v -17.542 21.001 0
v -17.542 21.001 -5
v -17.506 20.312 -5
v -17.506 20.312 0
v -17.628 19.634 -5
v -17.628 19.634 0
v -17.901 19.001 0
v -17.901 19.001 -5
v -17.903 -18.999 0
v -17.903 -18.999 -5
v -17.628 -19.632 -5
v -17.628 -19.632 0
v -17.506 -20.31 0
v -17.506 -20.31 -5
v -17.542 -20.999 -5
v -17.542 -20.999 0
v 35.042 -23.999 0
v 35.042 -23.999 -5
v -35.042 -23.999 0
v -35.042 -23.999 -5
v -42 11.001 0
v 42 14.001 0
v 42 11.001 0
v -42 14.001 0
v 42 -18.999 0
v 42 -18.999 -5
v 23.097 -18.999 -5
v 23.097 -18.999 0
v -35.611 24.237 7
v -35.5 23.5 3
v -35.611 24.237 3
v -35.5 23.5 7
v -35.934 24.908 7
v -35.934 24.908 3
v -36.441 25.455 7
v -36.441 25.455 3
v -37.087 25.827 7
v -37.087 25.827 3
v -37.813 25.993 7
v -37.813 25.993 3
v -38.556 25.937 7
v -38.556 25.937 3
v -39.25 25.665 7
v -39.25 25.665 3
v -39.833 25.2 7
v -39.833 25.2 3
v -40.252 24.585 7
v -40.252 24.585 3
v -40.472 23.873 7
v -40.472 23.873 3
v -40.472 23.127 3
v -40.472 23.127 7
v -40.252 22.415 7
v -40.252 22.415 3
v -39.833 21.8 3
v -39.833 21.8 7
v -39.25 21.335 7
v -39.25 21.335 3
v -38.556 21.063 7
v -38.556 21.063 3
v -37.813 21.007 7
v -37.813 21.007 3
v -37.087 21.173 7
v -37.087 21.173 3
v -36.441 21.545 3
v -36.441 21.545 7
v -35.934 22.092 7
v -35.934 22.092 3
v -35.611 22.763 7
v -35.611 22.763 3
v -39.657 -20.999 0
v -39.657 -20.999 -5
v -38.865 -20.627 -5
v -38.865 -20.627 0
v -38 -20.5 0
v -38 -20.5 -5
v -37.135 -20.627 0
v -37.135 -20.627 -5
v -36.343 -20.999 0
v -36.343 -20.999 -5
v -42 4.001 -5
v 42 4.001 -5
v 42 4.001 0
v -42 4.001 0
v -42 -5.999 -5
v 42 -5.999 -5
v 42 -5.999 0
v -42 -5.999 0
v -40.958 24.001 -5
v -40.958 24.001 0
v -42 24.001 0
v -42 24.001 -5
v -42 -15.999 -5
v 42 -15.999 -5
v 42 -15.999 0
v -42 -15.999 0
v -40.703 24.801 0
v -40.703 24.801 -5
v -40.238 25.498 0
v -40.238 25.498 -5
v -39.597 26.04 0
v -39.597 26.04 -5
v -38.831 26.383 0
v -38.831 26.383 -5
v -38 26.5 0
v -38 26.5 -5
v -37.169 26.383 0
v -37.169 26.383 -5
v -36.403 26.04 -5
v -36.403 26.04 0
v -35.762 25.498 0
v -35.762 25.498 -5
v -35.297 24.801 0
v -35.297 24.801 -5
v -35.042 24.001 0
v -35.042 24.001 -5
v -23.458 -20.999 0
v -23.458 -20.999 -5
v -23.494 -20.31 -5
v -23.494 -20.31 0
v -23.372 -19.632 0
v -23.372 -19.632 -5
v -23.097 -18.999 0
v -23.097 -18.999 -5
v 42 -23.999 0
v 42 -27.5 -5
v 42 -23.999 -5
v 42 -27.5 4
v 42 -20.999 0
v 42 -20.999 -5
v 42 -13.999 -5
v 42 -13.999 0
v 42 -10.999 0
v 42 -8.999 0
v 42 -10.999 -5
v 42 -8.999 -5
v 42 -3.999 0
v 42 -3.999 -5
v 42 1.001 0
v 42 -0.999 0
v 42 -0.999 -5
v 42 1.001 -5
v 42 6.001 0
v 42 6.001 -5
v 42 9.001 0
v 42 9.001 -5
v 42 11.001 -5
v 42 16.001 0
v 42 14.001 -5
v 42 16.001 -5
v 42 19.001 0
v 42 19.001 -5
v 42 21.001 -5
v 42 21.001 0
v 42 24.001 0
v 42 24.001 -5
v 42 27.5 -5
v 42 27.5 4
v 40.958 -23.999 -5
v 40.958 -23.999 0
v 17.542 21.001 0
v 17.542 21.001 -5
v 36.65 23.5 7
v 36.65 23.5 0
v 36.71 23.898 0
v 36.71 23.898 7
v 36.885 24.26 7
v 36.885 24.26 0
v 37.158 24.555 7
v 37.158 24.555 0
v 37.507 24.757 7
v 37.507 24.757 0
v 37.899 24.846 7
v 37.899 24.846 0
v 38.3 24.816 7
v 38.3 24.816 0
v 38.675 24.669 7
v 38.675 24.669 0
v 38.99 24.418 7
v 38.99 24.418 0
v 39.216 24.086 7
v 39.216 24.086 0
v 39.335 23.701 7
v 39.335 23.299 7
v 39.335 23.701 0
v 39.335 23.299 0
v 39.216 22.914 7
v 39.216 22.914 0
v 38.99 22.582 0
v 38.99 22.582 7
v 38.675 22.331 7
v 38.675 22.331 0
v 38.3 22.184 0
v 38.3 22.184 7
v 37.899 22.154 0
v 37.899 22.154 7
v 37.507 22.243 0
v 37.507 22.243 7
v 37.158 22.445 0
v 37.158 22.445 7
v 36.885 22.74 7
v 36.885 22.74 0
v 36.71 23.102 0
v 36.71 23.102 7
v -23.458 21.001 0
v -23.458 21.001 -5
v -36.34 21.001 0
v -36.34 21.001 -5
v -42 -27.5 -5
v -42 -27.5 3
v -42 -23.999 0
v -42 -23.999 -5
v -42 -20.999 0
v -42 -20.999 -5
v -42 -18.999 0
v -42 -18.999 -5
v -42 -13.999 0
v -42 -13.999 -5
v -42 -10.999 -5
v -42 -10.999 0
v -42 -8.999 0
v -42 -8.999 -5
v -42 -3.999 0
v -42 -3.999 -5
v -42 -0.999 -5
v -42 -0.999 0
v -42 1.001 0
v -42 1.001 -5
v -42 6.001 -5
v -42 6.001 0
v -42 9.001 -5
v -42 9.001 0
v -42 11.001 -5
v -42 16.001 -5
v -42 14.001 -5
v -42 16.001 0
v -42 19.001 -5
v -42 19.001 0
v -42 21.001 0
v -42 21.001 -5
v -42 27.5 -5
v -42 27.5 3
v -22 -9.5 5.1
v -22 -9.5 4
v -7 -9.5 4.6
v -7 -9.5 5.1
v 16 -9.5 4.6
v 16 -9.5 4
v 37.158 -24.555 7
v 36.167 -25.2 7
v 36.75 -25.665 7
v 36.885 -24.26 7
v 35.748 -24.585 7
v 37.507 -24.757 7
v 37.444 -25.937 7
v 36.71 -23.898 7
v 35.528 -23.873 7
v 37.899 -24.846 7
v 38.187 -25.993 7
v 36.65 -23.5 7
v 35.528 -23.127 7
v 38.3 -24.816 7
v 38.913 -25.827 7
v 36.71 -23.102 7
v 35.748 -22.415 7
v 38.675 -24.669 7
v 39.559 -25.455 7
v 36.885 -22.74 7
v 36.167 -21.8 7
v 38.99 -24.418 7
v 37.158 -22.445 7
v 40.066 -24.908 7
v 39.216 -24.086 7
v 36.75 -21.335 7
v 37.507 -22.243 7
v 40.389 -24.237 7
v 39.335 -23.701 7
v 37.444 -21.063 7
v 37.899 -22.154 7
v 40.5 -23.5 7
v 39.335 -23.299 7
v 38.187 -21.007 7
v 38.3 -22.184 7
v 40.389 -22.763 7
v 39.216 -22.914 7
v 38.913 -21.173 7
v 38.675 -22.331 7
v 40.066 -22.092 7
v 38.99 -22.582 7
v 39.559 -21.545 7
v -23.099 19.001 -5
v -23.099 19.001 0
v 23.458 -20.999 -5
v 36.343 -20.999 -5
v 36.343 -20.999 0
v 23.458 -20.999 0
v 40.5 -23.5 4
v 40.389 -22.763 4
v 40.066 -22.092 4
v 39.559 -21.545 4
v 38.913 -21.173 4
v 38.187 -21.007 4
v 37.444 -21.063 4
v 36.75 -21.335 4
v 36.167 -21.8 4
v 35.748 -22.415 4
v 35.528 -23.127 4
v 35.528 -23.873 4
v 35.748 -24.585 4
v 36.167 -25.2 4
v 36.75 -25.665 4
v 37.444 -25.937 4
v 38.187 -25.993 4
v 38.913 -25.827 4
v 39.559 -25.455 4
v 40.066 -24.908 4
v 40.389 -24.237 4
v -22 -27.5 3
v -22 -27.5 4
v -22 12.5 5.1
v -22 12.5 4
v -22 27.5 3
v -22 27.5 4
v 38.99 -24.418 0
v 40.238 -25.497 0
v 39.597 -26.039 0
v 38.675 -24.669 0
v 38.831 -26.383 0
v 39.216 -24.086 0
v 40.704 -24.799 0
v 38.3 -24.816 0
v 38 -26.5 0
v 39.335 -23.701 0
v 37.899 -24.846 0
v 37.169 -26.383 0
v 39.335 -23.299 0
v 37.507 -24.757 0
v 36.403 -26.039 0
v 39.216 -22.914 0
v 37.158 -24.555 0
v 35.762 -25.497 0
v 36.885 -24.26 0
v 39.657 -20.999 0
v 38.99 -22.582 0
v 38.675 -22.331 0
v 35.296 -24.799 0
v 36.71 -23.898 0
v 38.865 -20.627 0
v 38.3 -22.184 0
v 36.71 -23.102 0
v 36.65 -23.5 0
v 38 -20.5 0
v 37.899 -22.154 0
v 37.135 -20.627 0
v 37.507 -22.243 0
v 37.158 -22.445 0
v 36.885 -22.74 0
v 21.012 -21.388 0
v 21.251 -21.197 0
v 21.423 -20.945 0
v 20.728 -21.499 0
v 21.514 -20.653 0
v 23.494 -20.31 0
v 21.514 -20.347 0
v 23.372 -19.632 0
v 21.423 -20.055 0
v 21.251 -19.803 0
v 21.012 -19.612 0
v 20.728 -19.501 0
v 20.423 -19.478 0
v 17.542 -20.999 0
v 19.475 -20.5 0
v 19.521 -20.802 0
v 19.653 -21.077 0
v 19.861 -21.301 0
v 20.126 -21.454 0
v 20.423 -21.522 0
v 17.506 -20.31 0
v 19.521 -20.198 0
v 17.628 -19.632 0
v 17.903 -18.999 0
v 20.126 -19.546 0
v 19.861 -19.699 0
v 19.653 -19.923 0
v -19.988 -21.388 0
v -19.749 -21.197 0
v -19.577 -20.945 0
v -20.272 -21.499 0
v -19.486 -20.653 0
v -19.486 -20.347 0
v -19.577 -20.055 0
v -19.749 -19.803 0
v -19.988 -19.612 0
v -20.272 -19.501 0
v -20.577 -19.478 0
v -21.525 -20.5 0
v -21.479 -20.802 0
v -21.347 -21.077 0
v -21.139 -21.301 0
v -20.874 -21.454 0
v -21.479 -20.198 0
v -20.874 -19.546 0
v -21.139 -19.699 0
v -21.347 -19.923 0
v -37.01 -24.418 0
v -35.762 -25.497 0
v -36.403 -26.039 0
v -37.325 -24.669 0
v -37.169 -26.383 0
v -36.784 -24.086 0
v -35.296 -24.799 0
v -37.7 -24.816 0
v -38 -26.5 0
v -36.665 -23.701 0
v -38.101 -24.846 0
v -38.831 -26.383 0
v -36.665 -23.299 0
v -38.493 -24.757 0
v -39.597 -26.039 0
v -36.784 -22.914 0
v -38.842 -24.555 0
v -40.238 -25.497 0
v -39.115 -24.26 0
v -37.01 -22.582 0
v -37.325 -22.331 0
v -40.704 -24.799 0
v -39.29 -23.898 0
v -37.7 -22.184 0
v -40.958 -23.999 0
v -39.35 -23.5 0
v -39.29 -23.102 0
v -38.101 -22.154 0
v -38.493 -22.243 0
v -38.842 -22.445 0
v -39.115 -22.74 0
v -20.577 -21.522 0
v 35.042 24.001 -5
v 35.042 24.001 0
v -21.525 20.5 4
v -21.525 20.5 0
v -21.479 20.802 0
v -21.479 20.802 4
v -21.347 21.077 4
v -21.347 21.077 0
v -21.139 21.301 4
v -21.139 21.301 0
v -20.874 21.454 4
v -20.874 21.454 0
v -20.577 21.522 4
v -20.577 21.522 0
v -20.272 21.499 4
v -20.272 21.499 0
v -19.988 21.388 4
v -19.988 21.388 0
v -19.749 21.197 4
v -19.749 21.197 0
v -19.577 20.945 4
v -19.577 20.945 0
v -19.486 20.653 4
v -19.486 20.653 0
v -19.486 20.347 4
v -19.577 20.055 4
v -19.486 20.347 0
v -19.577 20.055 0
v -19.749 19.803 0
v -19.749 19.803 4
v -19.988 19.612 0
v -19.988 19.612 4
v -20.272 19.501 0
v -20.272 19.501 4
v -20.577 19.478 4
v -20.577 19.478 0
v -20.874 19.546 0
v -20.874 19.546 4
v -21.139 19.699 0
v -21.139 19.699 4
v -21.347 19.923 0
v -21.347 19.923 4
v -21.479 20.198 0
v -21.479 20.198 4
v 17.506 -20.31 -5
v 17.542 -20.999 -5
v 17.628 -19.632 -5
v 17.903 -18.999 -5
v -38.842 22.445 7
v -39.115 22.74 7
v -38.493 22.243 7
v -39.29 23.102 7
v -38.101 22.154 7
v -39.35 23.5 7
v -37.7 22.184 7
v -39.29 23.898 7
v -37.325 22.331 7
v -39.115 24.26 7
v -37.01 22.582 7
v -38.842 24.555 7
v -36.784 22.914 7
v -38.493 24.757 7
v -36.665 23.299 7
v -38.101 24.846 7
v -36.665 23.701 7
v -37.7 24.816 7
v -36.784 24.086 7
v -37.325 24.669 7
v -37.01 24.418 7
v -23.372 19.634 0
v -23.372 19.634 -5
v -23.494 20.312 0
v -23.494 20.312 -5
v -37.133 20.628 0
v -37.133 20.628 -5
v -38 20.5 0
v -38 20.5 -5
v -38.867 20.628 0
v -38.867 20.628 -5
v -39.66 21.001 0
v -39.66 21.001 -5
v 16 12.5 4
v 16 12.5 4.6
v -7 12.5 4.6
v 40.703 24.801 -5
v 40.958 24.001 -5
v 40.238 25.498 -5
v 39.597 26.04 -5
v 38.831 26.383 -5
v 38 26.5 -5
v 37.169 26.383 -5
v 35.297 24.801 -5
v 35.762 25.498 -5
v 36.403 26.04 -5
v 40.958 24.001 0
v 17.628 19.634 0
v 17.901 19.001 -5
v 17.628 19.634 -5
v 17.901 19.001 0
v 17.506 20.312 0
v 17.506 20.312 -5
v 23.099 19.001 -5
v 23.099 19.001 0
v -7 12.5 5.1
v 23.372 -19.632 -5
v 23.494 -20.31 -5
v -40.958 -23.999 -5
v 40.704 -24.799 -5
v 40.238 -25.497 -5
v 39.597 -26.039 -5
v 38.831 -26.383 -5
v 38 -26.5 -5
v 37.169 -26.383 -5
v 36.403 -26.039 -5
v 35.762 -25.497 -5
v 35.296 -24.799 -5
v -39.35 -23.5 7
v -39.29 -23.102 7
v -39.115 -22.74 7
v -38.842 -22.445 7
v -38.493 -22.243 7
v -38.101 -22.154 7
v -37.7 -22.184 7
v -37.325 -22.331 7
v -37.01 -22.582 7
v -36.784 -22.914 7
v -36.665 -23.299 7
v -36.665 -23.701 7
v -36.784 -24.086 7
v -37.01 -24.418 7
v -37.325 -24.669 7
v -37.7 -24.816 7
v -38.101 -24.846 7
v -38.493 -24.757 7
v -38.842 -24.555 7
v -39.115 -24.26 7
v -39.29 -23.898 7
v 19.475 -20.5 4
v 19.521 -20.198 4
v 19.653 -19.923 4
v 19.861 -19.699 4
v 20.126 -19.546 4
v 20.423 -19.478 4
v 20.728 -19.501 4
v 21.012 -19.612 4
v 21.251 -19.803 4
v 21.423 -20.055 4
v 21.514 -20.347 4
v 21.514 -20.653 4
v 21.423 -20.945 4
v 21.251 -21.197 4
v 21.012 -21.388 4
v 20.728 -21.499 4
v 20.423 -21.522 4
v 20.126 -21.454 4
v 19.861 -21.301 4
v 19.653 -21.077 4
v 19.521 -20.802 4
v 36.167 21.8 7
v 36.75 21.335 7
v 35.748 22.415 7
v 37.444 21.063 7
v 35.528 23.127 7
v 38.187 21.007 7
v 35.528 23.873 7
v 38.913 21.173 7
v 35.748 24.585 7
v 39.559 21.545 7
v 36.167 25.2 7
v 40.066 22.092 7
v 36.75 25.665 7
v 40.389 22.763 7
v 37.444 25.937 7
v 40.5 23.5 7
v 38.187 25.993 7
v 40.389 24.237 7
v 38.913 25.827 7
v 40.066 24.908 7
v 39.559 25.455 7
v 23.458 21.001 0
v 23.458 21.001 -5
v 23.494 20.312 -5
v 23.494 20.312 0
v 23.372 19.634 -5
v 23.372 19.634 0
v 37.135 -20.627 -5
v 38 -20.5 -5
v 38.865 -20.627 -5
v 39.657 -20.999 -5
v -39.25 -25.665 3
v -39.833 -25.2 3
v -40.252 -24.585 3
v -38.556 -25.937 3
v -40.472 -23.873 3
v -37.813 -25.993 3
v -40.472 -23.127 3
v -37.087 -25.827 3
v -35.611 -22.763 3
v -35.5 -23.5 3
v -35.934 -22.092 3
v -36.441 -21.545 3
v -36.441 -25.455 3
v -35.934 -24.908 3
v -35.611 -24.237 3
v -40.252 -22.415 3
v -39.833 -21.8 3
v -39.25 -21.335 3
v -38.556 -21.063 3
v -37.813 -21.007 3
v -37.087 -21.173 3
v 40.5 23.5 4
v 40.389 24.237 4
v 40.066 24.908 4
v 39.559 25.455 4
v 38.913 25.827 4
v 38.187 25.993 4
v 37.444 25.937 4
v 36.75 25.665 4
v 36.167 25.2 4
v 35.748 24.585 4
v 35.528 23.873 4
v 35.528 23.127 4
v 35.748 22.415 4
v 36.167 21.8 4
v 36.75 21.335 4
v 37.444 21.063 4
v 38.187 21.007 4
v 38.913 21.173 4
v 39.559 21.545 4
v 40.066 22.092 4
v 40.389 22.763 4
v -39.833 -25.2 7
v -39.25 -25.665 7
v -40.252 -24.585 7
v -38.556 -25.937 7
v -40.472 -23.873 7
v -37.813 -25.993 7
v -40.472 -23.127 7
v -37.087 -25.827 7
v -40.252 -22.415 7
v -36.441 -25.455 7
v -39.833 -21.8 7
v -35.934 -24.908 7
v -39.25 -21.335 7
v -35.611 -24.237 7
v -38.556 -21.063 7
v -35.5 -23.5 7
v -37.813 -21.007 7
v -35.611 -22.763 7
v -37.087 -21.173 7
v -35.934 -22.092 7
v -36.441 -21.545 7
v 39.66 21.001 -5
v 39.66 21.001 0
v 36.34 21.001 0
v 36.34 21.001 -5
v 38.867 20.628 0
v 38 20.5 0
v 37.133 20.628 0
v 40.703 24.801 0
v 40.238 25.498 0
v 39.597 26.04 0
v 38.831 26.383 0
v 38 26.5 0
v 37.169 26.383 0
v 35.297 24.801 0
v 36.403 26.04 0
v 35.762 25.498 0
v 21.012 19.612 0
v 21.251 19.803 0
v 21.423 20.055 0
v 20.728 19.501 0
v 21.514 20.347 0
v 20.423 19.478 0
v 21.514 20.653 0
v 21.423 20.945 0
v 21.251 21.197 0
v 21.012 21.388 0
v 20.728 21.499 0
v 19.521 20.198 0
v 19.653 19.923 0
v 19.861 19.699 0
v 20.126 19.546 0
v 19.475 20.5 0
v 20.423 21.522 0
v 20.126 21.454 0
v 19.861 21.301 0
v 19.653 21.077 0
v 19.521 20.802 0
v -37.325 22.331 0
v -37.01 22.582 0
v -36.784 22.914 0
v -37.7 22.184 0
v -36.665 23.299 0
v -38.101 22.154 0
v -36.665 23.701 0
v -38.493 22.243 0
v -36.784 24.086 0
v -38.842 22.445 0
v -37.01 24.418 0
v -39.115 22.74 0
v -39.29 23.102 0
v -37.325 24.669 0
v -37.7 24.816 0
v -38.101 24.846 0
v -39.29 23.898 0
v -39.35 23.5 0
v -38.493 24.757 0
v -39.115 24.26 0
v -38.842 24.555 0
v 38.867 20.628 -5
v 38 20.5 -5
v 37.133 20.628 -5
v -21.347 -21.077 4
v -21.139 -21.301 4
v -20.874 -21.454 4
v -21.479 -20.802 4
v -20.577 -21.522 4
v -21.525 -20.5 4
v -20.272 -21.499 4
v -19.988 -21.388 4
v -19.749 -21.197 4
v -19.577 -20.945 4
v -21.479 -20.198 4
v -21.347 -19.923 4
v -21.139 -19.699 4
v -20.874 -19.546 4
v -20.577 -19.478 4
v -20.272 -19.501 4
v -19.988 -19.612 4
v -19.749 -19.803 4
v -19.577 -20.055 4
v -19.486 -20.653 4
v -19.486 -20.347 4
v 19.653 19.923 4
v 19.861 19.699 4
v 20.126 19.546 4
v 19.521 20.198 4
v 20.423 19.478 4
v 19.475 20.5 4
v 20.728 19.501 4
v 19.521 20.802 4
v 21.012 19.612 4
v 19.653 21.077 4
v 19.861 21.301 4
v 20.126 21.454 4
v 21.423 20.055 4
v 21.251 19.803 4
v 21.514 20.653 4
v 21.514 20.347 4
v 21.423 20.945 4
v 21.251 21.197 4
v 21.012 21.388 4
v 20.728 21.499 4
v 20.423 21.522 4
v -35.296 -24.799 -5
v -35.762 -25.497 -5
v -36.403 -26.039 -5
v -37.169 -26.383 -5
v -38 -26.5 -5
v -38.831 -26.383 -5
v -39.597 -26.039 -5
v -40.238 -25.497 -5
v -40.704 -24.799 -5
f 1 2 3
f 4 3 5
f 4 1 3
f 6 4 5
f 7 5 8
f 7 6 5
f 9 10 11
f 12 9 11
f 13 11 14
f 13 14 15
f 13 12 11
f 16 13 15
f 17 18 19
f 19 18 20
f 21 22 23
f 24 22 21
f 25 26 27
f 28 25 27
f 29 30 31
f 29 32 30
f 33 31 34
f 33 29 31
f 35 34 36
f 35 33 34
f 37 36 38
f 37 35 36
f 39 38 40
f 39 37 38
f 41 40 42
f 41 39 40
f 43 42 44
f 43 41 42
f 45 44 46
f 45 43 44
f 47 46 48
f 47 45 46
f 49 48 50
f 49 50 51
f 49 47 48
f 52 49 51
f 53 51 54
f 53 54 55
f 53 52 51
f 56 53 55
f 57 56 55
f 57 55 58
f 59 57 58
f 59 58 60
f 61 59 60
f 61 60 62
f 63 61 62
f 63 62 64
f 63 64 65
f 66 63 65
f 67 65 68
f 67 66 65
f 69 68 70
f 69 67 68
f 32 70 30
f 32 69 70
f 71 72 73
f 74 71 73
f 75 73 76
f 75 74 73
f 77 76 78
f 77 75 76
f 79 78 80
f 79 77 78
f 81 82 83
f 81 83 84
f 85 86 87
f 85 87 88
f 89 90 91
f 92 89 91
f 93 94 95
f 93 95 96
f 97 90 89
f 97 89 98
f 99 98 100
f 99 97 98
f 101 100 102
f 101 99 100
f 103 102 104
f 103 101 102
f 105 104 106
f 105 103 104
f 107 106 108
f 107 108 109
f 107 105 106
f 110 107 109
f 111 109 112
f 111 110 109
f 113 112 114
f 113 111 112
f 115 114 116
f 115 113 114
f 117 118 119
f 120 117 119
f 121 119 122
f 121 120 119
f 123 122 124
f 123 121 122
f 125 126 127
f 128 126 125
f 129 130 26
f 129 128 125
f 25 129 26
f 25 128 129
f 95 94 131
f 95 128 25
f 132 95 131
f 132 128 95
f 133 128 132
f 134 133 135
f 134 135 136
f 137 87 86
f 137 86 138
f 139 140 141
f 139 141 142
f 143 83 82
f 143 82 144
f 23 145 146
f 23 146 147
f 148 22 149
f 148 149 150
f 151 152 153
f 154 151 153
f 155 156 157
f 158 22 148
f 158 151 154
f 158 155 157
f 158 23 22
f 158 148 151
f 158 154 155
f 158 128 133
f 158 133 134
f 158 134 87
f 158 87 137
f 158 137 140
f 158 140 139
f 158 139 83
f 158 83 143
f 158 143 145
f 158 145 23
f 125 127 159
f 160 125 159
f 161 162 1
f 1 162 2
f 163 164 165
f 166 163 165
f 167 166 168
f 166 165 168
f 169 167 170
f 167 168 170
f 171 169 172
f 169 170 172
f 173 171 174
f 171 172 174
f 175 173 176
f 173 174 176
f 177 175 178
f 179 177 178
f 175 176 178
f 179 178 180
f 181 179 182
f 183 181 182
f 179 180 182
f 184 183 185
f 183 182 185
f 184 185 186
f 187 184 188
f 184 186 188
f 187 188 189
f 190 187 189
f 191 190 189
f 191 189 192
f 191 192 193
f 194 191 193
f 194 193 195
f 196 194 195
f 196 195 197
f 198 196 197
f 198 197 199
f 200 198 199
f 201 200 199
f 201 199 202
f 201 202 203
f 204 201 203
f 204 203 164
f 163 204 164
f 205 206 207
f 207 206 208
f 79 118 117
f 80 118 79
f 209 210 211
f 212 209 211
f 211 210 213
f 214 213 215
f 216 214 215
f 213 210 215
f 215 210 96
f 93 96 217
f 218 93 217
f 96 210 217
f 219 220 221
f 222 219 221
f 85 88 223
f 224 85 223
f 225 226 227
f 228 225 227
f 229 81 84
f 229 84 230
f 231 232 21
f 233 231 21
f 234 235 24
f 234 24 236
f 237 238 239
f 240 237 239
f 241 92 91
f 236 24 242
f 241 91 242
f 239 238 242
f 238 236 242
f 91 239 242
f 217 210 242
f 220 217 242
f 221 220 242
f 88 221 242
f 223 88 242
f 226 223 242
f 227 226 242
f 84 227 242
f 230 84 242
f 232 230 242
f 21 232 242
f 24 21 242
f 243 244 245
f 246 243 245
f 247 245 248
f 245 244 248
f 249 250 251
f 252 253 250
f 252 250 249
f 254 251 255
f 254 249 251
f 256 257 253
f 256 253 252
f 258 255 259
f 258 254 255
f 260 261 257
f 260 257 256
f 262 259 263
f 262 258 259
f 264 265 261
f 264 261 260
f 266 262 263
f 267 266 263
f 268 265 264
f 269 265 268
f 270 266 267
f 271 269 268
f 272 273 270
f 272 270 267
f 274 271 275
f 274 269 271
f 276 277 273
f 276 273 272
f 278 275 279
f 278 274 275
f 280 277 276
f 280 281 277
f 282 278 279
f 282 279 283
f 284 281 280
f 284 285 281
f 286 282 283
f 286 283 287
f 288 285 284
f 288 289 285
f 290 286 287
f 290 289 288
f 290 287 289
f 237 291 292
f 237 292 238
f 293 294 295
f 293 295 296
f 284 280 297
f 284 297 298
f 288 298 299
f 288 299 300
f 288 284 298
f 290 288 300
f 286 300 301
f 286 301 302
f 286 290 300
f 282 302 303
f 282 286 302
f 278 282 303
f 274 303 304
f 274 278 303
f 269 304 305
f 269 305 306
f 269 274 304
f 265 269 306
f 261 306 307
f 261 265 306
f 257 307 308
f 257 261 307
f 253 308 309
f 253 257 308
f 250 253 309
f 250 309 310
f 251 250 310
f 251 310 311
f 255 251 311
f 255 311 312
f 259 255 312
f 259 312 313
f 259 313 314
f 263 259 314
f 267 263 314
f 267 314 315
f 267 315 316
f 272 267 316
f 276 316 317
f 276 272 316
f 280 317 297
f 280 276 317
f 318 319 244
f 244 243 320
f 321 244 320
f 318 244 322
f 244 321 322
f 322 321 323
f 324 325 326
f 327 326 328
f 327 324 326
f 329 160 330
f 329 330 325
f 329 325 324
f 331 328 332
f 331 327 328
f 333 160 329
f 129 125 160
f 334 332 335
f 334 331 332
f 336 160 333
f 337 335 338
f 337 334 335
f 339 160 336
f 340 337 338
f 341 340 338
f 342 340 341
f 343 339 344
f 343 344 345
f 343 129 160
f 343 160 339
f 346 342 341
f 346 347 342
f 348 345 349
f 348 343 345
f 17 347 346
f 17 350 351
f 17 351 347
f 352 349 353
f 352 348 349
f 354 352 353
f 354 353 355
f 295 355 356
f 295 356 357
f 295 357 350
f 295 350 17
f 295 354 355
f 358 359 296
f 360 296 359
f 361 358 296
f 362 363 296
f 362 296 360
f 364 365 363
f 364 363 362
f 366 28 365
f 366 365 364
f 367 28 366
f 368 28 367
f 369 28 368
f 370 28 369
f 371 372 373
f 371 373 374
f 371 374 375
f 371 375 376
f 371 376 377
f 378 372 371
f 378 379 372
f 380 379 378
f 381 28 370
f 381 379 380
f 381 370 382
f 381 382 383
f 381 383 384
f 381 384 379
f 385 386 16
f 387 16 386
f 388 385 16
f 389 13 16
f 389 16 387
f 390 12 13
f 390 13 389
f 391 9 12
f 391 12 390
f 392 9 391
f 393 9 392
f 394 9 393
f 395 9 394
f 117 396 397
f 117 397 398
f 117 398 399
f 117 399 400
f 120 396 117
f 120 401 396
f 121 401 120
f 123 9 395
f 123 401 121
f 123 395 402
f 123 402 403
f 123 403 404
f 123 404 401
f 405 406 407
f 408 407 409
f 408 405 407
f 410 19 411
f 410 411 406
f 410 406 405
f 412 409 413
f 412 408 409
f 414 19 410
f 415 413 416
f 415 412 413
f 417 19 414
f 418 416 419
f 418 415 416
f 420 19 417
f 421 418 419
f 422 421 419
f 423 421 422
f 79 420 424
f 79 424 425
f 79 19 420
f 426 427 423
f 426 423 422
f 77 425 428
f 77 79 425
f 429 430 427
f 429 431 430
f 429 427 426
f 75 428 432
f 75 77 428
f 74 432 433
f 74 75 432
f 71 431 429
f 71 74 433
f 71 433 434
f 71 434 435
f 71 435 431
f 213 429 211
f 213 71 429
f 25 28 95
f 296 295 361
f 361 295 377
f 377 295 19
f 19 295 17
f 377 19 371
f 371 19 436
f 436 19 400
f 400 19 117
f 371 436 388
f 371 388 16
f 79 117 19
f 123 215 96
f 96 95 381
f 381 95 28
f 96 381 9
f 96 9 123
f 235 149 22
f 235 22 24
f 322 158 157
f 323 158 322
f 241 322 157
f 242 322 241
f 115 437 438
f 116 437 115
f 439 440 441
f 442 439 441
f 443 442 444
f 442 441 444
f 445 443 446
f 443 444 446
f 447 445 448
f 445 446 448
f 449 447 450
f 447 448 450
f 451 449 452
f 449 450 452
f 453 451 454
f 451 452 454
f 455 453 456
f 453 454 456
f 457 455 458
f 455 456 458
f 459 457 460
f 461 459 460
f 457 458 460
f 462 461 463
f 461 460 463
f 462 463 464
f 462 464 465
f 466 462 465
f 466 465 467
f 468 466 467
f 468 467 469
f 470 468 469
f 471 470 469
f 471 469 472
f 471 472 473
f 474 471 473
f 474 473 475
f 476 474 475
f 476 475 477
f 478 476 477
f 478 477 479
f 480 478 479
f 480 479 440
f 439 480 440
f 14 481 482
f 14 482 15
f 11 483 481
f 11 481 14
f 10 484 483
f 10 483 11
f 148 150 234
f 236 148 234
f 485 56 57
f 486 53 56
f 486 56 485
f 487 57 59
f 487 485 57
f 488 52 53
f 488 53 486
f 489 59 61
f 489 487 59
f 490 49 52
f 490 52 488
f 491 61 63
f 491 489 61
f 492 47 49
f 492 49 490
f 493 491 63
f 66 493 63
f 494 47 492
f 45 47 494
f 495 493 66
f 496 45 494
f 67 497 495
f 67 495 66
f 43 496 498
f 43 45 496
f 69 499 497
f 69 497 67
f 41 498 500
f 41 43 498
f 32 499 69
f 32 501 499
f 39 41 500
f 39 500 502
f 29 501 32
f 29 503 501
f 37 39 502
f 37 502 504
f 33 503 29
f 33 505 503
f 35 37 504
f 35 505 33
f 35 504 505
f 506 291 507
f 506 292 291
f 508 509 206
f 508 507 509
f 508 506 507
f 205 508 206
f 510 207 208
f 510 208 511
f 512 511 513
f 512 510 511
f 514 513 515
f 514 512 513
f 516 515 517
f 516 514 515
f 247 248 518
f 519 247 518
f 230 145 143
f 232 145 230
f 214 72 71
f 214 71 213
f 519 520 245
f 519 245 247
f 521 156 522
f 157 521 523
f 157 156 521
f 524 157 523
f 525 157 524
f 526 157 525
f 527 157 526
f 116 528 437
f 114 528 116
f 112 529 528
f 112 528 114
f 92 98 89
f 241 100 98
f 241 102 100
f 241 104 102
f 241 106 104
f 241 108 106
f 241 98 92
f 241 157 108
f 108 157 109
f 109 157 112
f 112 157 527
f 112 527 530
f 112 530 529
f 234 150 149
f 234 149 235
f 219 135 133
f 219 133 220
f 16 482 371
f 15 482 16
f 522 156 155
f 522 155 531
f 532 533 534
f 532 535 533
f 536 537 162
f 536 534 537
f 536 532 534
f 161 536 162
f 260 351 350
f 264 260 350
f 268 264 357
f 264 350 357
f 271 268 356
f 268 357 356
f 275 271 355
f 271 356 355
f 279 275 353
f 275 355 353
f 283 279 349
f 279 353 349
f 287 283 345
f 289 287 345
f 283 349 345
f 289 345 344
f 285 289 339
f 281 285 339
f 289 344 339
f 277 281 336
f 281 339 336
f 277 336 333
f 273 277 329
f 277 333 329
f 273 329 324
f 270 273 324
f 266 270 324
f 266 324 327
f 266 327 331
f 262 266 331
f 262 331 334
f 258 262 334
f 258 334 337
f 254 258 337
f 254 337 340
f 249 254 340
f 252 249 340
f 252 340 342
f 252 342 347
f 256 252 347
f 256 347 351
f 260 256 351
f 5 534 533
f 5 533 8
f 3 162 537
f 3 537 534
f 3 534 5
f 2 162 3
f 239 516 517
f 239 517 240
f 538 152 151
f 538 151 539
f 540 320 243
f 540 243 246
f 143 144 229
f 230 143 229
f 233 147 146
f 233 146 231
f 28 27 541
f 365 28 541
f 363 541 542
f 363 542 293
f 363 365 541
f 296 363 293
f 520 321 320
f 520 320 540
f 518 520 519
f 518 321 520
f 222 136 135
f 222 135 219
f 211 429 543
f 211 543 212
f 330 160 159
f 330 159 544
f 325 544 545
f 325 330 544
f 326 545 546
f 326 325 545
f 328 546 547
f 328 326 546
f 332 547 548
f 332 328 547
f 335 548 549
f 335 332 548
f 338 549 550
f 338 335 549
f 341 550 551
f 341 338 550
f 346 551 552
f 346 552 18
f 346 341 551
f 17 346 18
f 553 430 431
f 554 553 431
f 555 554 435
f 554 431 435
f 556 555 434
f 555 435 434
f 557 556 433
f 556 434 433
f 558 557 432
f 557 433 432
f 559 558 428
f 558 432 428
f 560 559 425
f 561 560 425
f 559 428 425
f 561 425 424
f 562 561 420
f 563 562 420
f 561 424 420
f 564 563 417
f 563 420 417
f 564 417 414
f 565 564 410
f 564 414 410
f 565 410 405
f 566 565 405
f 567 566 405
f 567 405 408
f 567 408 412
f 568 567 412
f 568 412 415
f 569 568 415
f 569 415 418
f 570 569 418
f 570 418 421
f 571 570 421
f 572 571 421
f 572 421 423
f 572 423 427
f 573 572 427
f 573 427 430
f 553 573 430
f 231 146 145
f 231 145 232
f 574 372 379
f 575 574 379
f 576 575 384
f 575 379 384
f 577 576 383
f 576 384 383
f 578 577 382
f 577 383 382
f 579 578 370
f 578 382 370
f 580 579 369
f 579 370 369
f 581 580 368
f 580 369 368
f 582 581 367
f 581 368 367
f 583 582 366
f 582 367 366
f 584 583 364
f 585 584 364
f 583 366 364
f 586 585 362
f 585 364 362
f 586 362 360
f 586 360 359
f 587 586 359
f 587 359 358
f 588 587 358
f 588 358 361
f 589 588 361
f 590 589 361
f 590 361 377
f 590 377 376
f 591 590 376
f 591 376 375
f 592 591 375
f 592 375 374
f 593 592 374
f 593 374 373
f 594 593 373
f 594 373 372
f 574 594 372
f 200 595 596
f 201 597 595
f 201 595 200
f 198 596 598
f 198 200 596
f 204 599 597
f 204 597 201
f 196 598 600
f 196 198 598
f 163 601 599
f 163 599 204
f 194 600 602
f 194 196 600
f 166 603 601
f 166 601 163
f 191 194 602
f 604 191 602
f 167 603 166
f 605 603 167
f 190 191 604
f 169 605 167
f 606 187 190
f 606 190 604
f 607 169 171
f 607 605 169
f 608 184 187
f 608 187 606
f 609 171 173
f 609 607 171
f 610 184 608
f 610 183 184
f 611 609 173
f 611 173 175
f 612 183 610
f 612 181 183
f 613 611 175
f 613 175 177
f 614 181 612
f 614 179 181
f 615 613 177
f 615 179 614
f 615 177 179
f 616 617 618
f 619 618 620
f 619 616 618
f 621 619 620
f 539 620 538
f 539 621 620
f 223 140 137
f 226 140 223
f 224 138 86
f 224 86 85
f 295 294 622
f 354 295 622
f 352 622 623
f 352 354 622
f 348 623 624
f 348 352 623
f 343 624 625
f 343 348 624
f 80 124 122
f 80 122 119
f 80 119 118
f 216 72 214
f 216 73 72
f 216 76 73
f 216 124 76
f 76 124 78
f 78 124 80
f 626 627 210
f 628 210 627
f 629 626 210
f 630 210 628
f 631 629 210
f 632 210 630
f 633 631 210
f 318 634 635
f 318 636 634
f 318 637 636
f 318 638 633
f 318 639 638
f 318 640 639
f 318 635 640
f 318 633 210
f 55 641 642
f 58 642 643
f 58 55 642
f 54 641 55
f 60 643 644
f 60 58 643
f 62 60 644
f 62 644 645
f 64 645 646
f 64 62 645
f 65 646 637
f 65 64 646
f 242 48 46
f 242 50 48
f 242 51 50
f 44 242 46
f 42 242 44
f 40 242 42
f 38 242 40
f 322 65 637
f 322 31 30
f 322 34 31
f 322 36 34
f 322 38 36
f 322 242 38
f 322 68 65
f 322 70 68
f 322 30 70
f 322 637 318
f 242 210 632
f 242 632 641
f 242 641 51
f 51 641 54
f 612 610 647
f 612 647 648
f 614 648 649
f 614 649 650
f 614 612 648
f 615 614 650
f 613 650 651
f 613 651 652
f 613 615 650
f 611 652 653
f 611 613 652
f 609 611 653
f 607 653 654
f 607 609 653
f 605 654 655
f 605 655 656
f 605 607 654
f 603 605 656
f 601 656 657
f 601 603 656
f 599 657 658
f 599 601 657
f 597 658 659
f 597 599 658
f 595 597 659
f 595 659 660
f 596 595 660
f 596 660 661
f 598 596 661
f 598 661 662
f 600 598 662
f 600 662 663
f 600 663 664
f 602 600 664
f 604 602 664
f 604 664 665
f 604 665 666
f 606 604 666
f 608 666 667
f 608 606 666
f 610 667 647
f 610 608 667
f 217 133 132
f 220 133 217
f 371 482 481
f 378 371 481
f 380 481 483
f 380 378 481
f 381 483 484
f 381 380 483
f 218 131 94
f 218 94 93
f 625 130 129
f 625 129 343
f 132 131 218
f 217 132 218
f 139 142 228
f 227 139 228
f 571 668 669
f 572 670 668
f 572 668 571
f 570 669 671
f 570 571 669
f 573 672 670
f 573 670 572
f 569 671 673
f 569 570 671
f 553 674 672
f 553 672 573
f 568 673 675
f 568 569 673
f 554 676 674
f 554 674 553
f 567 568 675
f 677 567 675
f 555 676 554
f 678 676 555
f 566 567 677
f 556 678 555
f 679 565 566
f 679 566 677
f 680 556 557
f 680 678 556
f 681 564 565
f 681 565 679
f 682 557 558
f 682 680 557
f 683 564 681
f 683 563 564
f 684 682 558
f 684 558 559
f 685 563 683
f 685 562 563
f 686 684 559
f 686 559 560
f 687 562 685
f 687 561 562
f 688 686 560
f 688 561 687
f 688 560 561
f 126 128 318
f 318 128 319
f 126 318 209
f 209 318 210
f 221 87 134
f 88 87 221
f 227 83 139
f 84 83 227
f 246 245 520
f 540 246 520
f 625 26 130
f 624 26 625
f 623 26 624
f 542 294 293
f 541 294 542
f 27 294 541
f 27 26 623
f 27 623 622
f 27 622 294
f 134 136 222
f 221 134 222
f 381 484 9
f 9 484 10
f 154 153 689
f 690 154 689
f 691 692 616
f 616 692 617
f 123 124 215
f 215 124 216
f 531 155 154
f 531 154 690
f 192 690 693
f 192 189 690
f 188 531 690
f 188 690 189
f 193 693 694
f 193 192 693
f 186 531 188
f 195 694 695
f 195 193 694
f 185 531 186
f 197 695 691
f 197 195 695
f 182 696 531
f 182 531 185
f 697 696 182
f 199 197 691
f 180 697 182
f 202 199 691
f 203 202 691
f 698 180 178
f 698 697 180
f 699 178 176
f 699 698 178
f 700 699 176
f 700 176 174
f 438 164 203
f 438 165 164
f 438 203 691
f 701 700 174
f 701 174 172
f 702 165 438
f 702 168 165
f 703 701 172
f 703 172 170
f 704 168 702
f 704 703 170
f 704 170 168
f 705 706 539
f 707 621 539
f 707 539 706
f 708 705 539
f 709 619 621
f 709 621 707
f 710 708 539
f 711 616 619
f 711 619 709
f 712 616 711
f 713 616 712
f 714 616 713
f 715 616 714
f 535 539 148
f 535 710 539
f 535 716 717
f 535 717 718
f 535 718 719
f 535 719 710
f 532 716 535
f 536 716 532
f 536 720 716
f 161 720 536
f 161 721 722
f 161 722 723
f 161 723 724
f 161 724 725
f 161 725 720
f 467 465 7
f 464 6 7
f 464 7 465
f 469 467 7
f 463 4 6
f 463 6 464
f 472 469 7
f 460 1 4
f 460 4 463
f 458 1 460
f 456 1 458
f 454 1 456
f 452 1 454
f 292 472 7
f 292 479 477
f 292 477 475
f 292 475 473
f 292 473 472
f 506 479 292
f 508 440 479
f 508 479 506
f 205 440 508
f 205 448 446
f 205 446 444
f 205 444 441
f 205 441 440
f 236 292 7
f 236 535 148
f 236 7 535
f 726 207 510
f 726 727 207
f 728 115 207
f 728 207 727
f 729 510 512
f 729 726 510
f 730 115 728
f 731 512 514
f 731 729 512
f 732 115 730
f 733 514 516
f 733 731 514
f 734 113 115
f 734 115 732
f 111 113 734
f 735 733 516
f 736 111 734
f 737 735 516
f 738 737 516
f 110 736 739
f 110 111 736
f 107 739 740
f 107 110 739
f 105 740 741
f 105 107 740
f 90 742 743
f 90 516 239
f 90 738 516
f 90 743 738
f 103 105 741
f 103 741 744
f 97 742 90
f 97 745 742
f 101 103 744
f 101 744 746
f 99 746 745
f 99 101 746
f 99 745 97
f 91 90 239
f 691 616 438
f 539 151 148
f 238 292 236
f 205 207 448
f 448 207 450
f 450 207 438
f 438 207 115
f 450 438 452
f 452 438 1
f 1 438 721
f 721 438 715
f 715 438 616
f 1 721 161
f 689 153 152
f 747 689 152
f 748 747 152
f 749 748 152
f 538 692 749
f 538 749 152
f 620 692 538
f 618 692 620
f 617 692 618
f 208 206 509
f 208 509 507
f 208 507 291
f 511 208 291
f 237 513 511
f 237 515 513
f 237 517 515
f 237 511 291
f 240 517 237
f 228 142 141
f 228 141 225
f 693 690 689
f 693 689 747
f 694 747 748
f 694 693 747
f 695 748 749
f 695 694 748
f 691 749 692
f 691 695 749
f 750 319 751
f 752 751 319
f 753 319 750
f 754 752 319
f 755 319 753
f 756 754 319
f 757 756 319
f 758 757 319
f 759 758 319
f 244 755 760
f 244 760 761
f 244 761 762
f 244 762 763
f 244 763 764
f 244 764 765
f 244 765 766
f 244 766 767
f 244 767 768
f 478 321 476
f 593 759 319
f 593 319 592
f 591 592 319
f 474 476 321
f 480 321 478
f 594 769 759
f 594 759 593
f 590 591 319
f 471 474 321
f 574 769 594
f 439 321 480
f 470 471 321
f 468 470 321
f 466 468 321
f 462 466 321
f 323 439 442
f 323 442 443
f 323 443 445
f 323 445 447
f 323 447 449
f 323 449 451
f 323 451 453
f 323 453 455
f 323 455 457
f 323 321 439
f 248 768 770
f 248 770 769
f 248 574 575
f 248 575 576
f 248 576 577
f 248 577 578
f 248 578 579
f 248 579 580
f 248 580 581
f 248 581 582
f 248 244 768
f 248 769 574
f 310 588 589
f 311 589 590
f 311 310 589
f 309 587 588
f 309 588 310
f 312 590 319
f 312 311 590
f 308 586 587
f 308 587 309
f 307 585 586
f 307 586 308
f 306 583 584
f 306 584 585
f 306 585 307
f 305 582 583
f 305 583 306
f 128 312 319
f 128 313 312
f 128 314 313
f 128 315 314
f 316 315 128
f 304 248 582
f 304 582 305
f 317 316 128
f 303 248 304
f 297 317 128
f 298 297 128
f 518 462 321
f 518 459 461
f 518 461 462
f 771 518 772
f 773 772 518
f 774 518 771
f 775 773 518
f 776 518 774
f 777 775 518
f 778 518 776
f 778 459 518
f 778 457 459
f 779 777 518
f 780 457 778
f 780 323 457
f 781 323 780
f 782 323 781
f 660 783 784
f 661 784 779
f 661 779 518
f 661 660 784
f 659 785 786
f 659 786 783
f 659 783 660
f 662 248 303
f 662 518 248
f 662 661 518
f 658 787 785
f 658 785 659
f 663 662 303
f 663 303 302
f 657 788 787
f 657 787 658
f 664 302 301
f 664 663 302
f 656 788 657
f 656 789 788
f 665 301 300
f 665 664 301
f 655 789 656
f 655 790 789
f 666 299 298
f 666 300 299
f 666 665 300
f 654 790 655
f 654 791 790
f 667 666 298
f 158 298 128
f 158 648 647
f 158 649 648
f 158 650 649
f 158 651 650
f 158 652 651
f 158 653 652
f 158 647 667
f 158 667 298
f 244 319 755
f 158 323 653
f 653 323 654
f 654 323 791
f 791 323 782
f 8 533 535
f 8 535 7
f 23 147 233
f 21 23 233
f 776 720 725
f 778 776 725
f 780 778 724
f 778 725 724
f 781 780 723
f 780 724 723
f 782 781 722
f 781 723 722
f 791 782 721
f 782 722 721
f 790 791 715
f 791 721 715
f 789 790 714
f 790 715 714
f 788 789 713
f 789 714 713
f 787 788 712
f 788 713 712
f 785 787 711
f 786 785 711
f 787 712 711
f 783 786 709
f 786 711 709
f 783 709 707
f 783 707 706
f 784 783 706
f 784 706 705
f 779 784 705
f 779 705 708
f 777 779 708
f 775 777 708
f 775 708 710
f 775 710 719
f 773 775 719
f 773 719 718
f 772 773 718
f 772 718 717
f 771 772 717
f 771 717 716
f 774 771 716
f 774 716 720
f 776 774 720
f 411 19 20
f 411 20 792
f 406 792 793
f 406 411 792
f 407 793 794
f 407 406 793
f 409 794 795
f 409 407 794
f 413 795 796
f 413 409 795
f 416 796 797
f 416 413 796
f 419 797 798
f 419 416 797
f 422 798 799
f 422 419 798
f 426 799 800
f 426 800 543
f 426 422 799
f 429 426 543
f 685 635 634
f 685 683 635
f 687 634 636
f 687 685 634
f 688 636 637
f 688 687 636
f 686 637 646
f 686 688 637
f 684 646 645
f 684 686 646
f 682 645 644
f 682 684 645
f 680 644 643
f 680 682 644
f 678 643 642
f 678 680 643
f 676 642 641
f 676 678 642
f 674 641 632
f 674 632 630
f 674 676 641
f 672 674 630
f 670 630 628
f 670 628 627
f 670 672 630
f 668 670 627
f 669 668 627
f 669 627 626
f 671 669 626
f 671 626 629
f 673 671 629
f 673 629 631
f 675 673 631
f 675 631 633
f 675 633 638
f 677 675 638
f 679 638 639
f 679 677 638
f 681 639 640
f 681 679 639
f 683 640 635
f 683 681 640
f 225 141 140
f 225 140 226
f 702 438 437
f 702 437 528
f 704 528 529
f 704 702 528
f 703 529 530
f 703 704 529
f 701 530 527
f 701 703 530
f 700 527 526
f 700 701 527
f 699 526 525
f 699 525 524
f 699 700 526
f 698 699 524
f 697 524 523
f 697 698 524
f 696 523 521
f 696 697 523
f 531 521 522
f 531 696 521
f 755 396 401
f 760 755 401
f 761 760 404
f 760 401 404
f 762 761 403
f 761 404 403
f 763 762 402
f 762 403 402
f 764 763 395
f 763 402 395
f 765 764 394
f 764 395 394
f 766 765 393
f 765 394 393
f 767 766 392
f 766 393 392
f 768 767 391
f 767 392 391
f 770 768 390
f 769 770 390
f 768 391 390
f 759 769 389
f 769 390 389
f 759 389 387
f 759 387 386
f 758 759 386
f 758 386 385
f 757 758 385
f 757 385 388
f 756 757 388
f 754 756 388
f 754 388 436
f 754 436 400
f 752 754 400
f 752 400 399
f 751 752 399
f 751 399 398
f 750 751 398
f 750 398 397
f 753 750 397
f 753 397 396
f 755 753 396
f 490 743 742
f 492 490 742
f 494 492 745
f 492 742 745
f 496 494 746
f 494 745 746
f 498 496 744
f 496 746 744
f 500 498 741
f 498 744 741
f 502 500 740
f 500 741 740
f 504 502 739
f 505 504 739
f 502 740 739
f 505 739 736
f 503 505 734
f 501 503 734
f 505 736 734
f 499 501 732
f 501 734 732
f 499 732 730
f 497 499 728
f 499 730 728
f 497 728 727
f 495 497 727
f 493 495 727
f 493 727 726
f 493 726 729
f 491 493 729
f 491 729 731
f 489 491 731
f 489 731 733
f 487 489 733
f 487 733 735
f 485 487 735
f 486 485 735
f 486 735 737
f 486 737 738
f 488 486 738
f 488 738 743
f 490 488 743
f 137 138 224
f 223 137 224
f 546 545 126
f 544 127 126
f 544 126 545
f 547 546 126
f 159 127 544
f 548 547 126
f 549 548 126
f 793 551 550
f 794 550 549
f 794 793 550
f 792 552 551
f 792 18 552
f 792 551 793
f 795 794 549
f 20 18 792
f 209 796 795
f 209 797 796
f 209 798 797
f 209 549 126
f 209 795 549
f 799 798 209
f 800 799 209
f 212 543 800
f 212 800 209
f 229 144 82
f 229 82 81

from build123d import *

# Parameters (mm, degrees)
SKETCH1_W                  = 84
SKETCH1_H                  = 55
EXTRUDE1_DEPTH             = 7
F_2_7_2_7_DIAMETER_HOLE1_D = 2.7
SKETCH6_OUTSIDE_W          = 106.13
SKETCH6_OUTSIDE_H          = 77.13
SKETCH6_OUTSIDE_R          = 2.5
EXTRUDE2_DEPTH             = 3
SKETCH7_W                  = 15
SKETCH7_H                  = 22
EXTRUDE3_DEPTH             = 1.1
SKETCH8_W                  = 26.471562954
SKETCH8_H                  = 62.575334395
SKETCH8_R                  = 2.5
EXTRUDE6_DEPTH             = 1
SKETCH9_W                  = 23
SKETCH9_H                  = 22
EXTRUDE7_DEPTH             = 0.6
M2_5X0_45_TAPPED_HOLE1_D   = 2.05
SKETCH14_W                 = 84
SKETCH14_H                 = 55
SKETCH14_R                 = 3
EXTRUDE12_DEPTH            = 5
SKETCH16_W                 = 105.280390668
SKETCH16_H                 = 3
EXTRUDE13_DEPTH            = 5


with BuildPart() as part:
    # Sketch1 → Extrude1 (new body)
    with BuildSketch(Plane.XY):
        Rectangle(SKETCH1_W, SKETCH1_H)
    extrude(amount=EXTRUDE1_DEPTH)

    # Ø2.7 (2.7) Diameter Hole1 (through all)
    with Locations(Plane.XY.offset(7)):
        with Locations((-38, 23.5), (38, 23.5), (38, -23.5), (-38, -23.5)):
            Hole(F_2_7_2_7_DIAMETER_HOLE1_D / 2)

    # Sketch6 outside → Extrude2 (cut)
    with BuildSketch(Plane.XY.offset(7)):
        Rectangle(SKETCH6_OUTSIDE_W, SKETCH6_OUTSIDE_H)
        with Locations((-38, 23.5)):
            Circle(SKETCH6_OUTSIDE_R, mode=Mode.SUBTRACT)
        with Locations((-38, -23.5)):
            Circle(SKETCH6_OUTSIDE_R, mode=Mode.SUBTRACT)
        with Locations((38, 23.5)):
            Circle(SKETCH6_OUTSIDE_R, mode=Mode.SUBTRACT)
        with Locations((38, -23.5)):
            Circle(SKETCH6_OUTSIDE_R, mode=Mode.SUBTRACT)
    extrude(amount=-EXTRUDE2_DEPTH, mode=Mode.SUBTRACT)

    # Sketch7 → Extrude3 (add)
    with BuildSketch(Plane.XY.offset(4)):
        with Locations((-14.5, 1.5)):
            Rectangle(SKETCH7_W, SKETCH7_H)
    extrude(amount=EXTRUDE3_DEPTH)

    # Sketch8 → Extrude6 (cut)
    with BuildSketch(Plane.XY.offset(4)):
        with Locations((-35.235781477, -1.105270853)):
            Rectangle(SKETCH8_W, SKETCH8_H)
        with Locations((-38, -23.5)):
            Circle(SKETCH8_R, mode=Mode.SUBTRACT)
        with Locations((-38, 23.5)):
            Circle(SKETCH8_R, mode=Mode.SUBTRACT)
    extrude(amount=-EXTRUDE6_DEPTH, mode=Mode.SUBTRACT)

    # Sketch9 → Extrude7 (add)
    with BuildSketch(Plane.XY.offset(4)):
        with Locations((4.5, 1.5)):
            Rectangle(SKETCH9_W, SKETCH9_H)
    extrude(amount=EXTRUDE7_DEPTH)

    # M2.5x0.45 Tapped Hole1 (through all)
    with Locations(Plane.XY.offset(7)):
        with Locations((-20.5, 20.5), (20.5, 20.5), (20.5, -20.5), (-20.5, -20.5)):
            Hole(M2_5X0_45_TAPPED_HOLE1_D / 2)

    # Sketch14 → Extrude12 (add)
    with BuildSketch(Plane(origin=(0, 0, 0), x_dir=(-1, 0, 0), z_dir=(0, 0, -1))):
        Rectangle(SKETCH14_W, SKETCH14_H)
        with Locations((-38, 23.5)):
            Circle(SKETCH14_R, mode=Mode.SUBTRACT)
        with Locations((-20.5, 20.5)):
            Circle(SKETCH14_R, mode=Mode.SUBTRACT)
        with Locations((20.5, 20.5)):
            Circle(SKETCH14_R, mode=Mode.SUBTRACT)
        with Locations((38, 23.5)):
            Circle(SKETCH14_R, mode=Mode.SUBTRACT)
        with Locations((-38, -23.5)):
            Circle(SKETCH14_R, mode=Mode.SUBTRACT)
        with Locations((-20.5, -20.5)):
            Circle(SKETCH14_R, mode=Mode.SUBTRACT)
        with Locations((20.5, -20.5)):
            Circle(SKETCH14_R, mode=Mode.SUBTRACT)
        with Locations((38, -23.5)):
            Circle(SKETCH14_R, mode=Mode.SUBTRACT)
    extrude(amount=EXTRUDE12_DEPTH)

    # Sketch16 → Extrude13 (cut)
    with BuildSketch(Plane(origin=(0, 0, -5), x_dir=(-1, 0, 0), z_dir=(0, 0, -1))):
        with Locations((-1.715862013, -22.499)):
            Rectangle(SKETCH16_W, SKETCH16_H)
        with Locations((-1.715862013, -17.499)):
            Rectangle(SKETCH16_W, SKETCH16_H)
        with Locations((-1.715862013, -12.499)):
            Rectangle(SKETCH16_W, SKETCH16_H)
        with Locations((-1.715862013, -7.499)):
            Rectangle(SKETCH16_W, SKETCH16_H)
        with Locations((-1.715862013, -2.499)):
            Rectangle(SKETCH16_W, SKETCH16_H)
        with Locations((-1.715862013, 2.501)):
            Rectangle(SKETCH16_W, SKETCH16_H)
        with Locations((-1.715862013, 7.501)):
            Rectangle(SKETCH16_W, SKETCH16_H)
        with Locations((-1.715862013, 12.501)):
            Rectangle(SKETCH16_W, SKETCH16_H)
        with Locations((-1.715862013, 17.501)):
            Rectangle(SKETCH16_W, SKETCH16_H)
        with Locations((-1.715862013, 22.501)):
            Rectangle(SKETCH16_W, SKETCH16_H)
    extrude(amount=-EXTRUDE13_DEPTH, mode=Mode.SUBTRACT)


solid = part.part
